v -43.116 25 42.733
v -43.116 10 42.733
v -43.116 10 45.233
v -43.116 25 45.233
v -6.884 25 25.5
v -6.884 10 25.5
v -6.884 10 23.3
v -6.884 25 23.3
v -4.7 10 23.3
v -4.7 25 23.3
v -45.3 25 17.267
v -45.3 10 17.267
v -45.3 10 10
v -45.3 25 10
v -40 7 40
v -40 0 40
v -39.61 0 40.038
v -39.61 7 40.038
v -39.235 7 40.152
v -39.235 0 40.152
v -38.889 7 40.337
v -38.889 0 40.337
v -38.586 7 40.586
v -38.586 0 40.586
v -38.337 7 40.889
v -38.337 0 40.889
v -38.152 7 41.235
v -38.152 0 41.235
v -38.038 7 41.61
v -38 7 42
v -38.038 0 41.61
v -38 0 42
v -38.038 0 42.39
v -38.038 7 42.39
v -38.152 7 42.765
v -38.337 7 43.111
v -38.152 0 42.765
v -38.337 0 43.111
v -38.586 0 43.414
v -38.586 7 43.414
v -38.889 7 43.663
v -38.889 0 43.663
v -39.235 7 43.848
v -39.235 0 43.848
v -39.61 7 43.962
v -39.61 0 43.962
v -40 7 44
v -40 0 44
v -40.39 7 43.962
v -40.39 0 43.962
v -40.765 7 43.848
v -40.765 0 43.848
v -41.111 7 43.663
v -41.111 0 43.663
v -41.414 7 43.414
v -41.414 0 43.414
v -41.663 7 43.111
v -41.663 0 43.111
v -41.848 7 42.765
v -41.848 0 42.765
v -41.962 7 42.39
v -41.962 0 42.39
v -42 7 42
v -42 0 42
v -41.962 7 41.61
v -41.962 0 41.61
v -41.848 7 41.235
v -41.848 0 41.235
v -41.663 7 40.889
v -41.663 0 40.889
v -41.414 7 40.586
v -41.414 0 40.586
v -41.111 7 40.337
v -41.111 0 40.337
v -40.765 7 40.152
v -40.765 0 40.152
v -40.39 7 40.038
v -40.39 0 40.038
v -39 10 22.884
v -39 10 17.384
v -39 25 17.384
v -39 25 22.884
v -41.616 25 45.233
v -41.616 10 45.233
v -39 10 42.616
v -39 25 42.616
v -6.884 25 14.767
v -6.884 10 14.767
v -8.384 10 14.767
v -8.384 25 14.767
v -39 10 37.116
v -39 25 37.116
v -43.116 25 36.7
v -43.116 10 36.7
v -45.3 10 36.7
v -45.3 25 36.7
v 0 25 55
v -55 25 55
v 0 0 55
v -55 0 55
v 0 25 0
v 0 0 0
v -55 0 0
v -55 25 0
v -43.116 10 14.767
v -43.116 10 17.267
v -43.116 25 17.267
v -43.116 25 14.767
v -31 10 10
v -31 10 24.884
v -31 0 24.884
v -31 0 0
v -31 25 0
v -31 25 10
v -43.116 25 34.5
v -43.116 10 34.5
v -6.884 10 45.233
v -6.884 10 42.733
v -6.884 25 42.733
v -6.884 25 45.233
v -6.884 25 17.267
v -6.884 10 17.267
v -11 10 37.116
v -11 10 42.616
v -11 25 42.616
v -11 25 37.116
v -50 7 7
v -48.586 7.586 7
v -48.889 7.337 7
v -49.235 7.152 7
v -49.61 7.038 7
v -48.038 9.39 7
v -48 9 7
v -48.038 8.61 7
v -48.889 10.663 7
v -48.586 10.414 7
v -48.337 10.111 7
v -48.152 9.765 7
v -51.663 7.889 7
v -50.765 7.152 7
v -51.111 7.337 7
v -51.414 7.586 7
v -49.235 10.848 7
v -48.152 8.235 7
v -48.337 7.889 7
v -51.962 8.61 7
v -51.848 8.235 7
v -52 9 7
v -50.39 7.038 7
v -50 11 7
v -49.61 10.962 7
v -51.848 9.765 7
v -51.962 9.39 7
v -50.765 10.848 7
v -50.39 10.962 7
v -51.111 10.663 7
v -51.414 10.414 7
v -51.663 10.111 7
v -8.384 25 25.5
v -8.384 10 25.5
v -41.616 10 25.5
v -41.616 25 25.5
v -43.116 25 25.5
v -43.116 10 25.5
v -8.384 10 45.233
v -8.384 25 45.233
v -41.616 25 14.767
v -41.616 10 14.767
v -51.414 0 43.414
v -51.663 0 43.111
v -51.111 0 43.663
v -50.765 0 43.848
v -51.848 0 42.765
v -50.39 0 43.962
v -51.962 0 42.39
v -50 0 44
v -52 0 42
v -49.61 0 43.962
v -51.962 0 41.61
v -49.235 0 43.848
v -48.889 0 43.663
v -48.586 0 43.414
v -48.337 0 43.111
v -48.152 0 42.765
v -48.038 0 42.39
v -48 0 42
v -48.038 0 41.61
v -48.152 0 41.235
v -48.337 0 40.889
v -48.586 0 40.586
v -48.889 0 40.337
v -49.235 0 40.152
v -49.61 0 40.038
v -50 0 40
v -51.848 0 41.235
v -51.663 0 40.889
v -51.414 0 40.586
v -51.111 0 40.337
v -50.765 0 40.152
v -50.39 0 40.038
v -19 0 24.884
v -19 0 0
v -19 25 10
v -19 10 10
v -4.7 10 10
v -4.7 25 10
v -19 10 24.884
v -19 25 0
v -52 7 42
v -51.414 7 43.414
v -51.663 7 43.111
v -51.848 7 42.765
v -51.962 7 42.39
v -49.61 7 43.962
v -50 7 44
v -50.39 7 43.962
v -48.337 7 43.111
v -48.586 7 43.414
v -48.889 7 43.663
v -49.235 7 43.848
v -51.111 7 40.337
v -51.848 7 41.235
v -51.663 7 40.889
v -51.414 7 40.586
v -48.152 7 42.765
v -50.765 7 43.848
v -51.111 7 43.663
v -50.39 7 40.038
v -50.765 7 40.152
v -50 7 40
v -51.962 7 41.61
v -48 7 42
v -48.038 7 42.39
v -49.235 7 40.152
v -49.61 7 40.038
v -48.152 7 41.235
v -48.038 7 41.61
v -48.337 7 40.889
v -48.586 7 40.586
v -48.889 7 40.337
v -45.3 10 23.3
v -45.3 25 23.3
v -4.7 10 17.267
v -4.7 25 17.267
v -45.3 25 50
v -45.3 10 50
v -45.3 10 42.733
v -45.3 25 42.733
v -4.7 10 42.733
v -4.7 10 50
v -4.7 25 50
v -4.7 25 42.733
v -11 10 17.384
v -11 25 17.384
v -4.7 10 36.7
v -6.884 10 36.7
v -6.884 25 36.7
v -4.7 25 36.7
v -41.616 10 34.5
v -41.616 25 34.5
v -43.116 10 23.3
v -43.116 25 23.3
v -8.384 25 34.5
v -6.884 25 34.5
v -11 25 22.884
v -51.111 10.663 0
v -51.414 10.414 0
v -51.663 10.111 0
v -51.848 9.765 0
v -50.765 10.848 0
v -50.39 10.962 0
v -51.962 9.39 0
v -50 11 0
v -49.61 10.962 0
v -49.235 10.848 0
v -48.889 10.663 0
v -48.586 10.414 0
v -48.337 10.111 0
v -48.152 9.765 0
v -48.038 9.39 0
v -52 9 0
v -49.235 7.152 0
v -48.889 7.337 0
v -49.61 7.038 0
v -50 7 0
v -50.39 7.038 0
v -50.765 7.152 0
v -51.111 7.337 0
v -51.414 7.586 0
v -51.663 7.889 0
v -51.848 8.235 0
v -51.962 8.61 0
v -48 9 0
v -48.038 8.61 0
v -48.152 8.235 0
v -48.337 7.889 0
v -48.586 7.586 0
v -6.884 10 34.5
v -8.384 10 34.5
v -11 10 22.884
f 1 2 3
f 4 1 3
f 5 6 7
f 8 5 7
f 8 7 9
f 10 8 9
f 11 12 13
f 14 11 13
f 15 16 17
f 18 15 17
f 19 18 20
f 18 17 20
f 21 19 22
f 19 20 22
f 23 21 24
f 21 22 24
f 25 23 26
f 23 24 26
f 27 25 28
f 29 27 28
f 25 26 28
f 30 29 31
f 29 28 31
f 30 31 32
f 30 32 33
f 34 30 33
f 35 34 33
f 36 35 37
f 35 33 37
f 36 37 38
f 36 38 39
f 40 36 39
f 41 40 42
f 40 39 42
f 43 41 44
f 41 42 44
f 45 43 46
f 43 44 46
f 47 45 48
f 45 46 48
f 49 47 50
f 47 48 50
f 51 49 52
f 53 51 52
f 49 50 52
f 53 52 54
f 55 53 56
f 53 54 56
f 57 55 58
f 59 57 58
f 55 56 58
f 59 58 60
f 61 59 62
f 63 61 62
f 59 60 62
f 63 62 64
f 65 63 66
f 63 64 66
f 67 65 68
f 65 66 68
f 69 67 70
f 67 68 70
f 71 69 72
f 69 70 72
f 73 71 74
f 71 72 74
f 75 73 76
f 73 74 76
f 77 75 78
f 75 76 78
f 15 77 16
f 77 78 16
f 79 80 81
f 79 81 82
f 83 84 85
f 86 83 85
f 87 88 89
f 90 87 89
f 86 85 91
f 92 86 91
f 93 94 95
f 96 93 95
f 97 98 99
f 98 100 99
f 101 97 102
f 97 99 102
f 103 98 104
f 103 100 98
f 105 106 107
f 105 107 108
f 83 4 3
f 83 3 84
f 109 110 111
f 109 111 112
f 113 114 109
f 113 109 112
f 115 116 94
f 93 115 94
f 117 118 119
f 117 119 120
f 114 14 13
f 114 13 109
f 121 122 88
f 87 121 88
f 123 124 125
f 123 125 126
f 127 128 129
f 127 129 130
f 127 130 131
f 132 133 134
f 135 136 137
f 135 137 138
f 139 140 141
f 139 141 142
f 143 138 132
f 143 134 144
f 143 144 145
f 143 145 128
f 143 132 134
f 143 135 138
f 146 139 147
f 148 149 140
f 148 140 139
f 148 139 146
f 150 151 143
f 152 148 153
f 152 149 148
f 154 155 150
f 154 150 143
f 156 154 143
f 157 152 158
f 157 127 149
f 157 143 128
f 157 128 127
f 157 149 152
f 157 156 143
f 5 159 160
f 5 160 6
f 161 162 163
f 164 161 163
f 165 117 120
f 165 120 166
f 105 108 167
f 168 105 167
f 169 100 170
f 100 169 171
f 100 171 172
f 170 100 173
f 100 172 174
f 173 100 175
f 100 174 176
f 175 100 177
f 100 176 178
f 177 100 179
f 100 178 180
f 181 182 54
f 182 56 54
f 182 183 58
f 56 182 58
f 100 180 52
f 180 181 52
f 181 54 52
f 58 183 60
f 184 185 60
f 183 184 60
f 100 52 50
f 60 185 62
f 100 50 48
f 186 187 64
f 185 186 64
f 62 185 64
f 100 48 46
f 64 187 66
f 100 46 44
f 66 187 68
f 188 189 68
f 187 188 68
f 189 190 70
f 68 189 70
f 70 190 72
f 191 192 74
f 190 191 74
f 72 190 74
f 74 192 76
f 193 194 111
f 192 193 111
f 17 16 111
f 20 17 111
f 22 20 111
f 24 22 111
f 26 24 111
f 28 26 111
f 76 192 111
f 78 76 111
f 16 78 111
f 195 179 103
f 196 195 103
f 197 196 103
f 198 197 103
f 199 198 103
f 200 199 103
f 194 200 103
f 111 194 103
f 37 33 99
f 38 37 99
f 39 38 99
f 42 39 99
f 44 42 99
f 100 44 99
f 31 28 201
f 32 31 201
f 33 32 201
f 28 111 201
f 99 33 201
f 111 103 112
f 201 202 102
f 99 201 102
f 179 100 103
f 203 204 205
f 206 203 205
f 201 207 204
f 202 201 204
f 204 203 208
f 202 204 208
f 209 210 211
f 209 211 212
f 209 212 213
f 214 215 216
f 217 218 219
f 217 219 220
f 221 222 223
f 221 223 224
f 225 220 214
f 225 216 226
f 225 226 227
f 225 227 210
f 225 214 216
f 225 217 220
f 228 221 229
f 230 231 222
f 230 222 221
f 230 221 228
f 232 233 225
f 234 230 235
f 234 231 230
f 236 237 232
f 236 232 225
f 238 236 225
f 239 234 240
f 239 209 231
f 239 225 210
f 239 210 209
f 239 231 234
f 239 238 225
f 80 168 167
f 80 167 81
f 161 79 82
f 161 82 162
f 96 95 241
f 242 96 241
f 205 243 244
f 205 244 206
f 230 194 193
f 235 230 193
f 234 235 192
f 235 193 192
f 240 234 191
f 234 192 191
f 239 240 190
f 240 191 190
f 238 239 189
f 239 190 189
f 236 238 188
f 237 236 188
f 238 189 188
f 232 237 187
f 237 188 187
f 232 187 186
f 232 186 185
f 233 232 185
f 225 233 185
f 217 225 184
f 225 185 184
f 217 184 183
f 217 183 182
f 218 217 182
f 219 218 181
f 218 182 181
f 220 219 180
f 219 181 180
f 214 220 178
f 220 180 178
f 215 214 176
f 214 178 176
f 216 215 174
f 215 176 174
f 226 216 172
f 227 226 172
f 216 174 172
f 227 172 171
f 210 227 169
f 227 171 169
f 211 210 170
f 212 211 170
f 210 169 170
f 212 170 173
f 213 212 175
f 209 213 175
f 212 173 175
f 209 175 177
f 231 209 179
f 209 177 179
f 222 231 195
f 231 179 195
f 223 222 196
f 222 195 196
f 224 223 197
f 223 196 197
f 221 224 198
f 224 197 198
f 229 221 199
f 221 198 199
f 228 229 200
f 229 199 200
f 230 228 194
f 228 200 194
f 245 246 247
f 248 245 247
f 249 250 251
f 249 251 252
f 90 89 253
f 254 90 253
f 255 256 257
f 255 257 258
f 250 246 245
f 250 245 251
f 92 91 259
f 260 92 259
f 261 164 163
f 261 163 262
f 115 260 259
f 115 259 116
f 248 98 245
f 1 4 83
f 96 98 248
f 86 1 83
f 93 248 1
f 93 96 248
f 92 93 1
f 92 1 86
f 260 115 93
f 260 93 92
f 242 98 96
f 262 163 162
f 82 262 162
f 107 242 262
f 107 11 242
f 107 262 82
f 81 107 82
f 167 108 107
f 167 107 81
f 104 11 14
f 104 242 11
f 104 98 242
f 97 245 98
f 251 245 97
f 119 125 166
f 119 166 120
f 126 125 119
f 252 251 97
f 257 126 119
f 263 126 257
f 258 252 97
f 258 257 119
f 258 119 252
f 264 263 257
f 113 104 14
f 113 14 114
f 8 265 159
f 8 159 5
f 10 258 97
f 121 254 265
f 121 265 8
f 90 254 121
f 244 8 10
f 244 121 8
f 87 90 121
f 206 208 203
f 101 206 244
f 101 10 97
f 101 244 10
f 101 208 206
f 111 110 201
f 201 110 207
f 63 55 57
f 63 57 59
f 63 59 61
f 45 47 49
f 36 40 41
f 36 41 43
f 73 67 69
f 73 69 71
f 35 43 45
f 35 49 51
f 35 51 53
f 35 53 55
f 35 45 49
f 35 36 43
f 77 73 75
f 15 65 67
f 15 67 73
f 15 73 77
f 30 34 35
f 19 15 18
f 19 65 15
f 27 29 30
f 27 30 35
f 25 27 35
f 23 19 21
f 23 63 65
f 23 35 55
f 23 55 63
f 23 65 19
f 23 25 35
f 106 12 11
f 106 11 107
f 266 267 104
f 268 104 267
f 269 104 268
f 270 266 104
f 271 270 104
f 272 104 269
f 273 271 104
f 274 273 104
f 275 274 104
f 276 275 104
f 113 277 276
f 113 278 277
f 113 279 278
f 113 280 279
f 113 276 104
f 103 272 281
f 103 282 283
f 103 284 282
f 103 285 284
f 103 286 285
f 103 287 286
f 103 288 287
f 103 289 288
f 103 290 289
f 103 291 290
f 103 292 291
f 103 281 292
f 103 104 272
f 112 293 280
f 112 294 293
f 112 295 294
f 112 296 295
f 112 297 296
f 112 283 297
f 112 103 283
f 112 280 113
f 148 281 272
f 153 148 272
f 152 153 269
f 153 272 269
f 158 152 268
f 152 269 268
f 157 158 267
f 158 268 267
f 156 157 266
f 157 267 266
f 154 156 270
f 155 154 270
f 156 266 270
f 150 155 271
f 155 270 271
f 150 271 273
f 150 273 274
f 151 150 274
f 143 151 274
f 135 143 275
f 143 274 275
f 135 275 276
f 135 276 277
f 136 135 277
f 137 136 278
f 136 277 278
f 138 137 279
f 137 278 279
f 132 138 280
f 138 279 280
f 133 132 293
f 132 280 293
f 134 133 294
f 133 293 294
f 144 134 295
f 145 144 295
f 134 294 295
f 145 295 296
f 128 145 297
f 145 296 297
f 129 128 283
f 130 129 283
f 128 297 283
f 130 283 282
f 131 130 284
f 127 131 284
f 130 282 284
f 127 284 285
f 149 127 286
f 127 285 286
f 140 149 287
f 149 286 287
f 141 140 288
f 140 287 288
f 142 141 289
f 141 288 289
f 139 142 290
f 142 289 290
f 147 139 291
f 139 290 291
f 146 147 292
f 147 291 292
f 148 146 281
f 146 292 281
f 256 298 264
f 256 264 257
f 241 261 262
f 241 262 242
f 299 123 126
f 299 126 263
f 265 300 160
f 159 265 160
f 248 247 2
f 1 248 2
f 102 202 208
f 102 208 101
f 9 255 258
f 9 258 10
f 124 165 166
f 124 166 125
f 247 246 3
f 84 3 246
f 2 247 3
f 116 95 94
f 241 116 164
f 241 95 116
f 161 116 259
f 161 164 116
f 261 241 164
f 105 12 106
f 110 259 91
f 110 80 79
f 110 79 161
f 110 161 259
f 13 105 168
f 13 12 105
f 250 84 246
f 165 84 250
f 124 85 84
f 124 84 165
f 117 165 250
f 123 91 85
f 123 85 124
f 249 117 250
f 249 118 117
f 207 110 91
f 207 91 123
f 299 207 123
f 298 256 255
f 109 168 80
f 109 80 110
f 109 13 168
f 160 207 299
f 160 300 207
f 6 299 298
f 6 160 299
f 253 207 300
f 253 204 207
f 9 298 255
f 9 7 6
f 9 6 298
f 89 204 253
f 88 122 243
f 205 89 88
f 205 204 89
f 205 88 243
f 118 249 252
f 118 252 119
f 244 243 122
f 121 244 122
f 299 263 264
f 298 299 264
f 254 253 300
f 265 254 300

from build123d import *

# Parameters (mm, degrees)
SKETCH1_W           = 55
SKETCH1_H           = 55
BOSS_EXTRUDE1_DEPTH = 10
BOSS_EXTRUDE3_DEPTH = 15
SKETCH3_W           = 55
SKETCH3_H           = 55
SKETCH3_W_2         = 40.6
SKETCH3_H_2         = 40
BOSS_EXTRUDE5_DEPTH = 15
SKETCH7_W           = 12
SKETCH7_H           = 24.88370491
CUT_EXTRUDE3_DEPTH  = 30
SKETCH8_R           = 2
CUT_EXTRUDE4_DEPTH  = 7
SKETCH9_R           = 2
CUT_EXTRUDE5_DEPTH  = 7


with BuildPart() as part:
    # Sketch1 → Boss-Extrude1 (new body)
    with BuildSketch(Plane(origin=(0, 0, 0), x_dir=(1, 0, 0), z_dir=(0, 1, 0))):
        with Locations((-27.5, -27.5)):
            Rectangle(SKETCH1_W, SKETCH1_H)
    extrude(amount=BOSS_EXTRUDE1_DEPTH)

    # Sketch2 → Boss-Extrude3 (add)
    with BuildSketch(Plane(origin=(0, 10, 0), x_dir=(1, 0, 0), z_dir=(0, 1, 0))):
        Polygon((-45.31629509, -17.267409819), (-43.11629509, -17.267409819), (-43.11629509, -14.767409819), (-41.61629509, -14.767409819), (-39, -17.38370491), (-39, -22.88370491), (-41.61629509, -25.5), (-43.11629509, -25.5), (-43.11629509, -23.3), (-45.31629509, -23.3), align=None)
        Polygon((-6.88370491, -23.3), (-4.68370491, -23.3), (-4.68370491, -17.267409819), (-6.88370491, -17.267409819), (-6.88370491, -14.767409819), (-8.38370491, -14.767409819), (-11, -17.38370491), (-11, -22.88370491), (-8.38370491, -25.5), (-6.88370491, -25.5), align=None)
        Polygon((-43.11629509, -36.7), (-45.31629509, -36.7), (-45.31629509, -42.732590181), (-43.11629509, -42.732590181), (-43.11629509, -45.232590181), (-41.61629509, -45.232590181), (-39, -42.61629509), (-39, -37.11629509), (-41.61629509, -34.5), (-43.11629509, -34.5), align=None)
        Polygon((-6.88370491, -34.5), (-6.88370491, -36.7), (-4.68370491, -36.7), (-4.68370491, -42.732590181), (-6.88370491, -42.732590181), (-6.88370491, -45.232590181), (-8.38370491, -45.232590181), (-11, -42.61629509), (-11, -37.11629509), (-8.38370491, -34.5), align=None)
    extrude(amount=BOSS_EXTRUDE3_DEPTH)

    # Sketch3 → Boss-Extrude5 (add)
    with BuildSketch(Plane(origin=(0, 10, 0), x_dir=(1, 0, 0), z_dir=(0, 1, 0))):
        with Locations((-27.5, -27.5)):
            Rectangle(SKETCH3_W, SKETCH3_H)
        with Locations((-25, -30)):
            Rectangle(SKETCH3_W_2, SKETCH3_H_2, mode=Mode.SUBTRACT)
    extrude(amount=BOSS_EXTRUDE5_DEPTH)

    # Sketch7 → Cut-Extrude3 (cut)
    with BuildSketch(Plane(origin=(0, 25, 0), x_dir=(1, 0, 0), z_dir=(0, 1, 0))):
        with Locations((-25, -12.441852455)):
            Rectangle(SKETCH7_W, SKETCH7_H)
    extrude(amount=-CUT_EXTRUDE3_DEPTH, mode=Mode.SUBTRACT)

    # Sketch8 → Cut-Extrude4 (cut)
    with BuildSketch(Plane(origin=(0, 0, 0), x_dir=(-1, 0, 0), z_dir=(0, 0, -1))):
        with Locations((50, 9)):
            Circle(SKETCH8_R)
    extrude(amount=-CUT_EXTRUDE4_DEPTH, mode=Mode.SUBTRACT)

    # Sketch9 → Cut-Extrude5 (cut)
    with BuildSketch(Plane.XZ):
        with Locations(Location((-40, 42, 0), (0, 0, 270))):
            Circle(SKETCH9_R)
        with Locations(Location((-50, 42, 0), (0, 0, 270))):
            Circle(SKETCH9_R)
    extrude(amount=-CUT_EXTRUDE5_DEPTH, mode=Mode.SUBTRACT)


solid = part.part
